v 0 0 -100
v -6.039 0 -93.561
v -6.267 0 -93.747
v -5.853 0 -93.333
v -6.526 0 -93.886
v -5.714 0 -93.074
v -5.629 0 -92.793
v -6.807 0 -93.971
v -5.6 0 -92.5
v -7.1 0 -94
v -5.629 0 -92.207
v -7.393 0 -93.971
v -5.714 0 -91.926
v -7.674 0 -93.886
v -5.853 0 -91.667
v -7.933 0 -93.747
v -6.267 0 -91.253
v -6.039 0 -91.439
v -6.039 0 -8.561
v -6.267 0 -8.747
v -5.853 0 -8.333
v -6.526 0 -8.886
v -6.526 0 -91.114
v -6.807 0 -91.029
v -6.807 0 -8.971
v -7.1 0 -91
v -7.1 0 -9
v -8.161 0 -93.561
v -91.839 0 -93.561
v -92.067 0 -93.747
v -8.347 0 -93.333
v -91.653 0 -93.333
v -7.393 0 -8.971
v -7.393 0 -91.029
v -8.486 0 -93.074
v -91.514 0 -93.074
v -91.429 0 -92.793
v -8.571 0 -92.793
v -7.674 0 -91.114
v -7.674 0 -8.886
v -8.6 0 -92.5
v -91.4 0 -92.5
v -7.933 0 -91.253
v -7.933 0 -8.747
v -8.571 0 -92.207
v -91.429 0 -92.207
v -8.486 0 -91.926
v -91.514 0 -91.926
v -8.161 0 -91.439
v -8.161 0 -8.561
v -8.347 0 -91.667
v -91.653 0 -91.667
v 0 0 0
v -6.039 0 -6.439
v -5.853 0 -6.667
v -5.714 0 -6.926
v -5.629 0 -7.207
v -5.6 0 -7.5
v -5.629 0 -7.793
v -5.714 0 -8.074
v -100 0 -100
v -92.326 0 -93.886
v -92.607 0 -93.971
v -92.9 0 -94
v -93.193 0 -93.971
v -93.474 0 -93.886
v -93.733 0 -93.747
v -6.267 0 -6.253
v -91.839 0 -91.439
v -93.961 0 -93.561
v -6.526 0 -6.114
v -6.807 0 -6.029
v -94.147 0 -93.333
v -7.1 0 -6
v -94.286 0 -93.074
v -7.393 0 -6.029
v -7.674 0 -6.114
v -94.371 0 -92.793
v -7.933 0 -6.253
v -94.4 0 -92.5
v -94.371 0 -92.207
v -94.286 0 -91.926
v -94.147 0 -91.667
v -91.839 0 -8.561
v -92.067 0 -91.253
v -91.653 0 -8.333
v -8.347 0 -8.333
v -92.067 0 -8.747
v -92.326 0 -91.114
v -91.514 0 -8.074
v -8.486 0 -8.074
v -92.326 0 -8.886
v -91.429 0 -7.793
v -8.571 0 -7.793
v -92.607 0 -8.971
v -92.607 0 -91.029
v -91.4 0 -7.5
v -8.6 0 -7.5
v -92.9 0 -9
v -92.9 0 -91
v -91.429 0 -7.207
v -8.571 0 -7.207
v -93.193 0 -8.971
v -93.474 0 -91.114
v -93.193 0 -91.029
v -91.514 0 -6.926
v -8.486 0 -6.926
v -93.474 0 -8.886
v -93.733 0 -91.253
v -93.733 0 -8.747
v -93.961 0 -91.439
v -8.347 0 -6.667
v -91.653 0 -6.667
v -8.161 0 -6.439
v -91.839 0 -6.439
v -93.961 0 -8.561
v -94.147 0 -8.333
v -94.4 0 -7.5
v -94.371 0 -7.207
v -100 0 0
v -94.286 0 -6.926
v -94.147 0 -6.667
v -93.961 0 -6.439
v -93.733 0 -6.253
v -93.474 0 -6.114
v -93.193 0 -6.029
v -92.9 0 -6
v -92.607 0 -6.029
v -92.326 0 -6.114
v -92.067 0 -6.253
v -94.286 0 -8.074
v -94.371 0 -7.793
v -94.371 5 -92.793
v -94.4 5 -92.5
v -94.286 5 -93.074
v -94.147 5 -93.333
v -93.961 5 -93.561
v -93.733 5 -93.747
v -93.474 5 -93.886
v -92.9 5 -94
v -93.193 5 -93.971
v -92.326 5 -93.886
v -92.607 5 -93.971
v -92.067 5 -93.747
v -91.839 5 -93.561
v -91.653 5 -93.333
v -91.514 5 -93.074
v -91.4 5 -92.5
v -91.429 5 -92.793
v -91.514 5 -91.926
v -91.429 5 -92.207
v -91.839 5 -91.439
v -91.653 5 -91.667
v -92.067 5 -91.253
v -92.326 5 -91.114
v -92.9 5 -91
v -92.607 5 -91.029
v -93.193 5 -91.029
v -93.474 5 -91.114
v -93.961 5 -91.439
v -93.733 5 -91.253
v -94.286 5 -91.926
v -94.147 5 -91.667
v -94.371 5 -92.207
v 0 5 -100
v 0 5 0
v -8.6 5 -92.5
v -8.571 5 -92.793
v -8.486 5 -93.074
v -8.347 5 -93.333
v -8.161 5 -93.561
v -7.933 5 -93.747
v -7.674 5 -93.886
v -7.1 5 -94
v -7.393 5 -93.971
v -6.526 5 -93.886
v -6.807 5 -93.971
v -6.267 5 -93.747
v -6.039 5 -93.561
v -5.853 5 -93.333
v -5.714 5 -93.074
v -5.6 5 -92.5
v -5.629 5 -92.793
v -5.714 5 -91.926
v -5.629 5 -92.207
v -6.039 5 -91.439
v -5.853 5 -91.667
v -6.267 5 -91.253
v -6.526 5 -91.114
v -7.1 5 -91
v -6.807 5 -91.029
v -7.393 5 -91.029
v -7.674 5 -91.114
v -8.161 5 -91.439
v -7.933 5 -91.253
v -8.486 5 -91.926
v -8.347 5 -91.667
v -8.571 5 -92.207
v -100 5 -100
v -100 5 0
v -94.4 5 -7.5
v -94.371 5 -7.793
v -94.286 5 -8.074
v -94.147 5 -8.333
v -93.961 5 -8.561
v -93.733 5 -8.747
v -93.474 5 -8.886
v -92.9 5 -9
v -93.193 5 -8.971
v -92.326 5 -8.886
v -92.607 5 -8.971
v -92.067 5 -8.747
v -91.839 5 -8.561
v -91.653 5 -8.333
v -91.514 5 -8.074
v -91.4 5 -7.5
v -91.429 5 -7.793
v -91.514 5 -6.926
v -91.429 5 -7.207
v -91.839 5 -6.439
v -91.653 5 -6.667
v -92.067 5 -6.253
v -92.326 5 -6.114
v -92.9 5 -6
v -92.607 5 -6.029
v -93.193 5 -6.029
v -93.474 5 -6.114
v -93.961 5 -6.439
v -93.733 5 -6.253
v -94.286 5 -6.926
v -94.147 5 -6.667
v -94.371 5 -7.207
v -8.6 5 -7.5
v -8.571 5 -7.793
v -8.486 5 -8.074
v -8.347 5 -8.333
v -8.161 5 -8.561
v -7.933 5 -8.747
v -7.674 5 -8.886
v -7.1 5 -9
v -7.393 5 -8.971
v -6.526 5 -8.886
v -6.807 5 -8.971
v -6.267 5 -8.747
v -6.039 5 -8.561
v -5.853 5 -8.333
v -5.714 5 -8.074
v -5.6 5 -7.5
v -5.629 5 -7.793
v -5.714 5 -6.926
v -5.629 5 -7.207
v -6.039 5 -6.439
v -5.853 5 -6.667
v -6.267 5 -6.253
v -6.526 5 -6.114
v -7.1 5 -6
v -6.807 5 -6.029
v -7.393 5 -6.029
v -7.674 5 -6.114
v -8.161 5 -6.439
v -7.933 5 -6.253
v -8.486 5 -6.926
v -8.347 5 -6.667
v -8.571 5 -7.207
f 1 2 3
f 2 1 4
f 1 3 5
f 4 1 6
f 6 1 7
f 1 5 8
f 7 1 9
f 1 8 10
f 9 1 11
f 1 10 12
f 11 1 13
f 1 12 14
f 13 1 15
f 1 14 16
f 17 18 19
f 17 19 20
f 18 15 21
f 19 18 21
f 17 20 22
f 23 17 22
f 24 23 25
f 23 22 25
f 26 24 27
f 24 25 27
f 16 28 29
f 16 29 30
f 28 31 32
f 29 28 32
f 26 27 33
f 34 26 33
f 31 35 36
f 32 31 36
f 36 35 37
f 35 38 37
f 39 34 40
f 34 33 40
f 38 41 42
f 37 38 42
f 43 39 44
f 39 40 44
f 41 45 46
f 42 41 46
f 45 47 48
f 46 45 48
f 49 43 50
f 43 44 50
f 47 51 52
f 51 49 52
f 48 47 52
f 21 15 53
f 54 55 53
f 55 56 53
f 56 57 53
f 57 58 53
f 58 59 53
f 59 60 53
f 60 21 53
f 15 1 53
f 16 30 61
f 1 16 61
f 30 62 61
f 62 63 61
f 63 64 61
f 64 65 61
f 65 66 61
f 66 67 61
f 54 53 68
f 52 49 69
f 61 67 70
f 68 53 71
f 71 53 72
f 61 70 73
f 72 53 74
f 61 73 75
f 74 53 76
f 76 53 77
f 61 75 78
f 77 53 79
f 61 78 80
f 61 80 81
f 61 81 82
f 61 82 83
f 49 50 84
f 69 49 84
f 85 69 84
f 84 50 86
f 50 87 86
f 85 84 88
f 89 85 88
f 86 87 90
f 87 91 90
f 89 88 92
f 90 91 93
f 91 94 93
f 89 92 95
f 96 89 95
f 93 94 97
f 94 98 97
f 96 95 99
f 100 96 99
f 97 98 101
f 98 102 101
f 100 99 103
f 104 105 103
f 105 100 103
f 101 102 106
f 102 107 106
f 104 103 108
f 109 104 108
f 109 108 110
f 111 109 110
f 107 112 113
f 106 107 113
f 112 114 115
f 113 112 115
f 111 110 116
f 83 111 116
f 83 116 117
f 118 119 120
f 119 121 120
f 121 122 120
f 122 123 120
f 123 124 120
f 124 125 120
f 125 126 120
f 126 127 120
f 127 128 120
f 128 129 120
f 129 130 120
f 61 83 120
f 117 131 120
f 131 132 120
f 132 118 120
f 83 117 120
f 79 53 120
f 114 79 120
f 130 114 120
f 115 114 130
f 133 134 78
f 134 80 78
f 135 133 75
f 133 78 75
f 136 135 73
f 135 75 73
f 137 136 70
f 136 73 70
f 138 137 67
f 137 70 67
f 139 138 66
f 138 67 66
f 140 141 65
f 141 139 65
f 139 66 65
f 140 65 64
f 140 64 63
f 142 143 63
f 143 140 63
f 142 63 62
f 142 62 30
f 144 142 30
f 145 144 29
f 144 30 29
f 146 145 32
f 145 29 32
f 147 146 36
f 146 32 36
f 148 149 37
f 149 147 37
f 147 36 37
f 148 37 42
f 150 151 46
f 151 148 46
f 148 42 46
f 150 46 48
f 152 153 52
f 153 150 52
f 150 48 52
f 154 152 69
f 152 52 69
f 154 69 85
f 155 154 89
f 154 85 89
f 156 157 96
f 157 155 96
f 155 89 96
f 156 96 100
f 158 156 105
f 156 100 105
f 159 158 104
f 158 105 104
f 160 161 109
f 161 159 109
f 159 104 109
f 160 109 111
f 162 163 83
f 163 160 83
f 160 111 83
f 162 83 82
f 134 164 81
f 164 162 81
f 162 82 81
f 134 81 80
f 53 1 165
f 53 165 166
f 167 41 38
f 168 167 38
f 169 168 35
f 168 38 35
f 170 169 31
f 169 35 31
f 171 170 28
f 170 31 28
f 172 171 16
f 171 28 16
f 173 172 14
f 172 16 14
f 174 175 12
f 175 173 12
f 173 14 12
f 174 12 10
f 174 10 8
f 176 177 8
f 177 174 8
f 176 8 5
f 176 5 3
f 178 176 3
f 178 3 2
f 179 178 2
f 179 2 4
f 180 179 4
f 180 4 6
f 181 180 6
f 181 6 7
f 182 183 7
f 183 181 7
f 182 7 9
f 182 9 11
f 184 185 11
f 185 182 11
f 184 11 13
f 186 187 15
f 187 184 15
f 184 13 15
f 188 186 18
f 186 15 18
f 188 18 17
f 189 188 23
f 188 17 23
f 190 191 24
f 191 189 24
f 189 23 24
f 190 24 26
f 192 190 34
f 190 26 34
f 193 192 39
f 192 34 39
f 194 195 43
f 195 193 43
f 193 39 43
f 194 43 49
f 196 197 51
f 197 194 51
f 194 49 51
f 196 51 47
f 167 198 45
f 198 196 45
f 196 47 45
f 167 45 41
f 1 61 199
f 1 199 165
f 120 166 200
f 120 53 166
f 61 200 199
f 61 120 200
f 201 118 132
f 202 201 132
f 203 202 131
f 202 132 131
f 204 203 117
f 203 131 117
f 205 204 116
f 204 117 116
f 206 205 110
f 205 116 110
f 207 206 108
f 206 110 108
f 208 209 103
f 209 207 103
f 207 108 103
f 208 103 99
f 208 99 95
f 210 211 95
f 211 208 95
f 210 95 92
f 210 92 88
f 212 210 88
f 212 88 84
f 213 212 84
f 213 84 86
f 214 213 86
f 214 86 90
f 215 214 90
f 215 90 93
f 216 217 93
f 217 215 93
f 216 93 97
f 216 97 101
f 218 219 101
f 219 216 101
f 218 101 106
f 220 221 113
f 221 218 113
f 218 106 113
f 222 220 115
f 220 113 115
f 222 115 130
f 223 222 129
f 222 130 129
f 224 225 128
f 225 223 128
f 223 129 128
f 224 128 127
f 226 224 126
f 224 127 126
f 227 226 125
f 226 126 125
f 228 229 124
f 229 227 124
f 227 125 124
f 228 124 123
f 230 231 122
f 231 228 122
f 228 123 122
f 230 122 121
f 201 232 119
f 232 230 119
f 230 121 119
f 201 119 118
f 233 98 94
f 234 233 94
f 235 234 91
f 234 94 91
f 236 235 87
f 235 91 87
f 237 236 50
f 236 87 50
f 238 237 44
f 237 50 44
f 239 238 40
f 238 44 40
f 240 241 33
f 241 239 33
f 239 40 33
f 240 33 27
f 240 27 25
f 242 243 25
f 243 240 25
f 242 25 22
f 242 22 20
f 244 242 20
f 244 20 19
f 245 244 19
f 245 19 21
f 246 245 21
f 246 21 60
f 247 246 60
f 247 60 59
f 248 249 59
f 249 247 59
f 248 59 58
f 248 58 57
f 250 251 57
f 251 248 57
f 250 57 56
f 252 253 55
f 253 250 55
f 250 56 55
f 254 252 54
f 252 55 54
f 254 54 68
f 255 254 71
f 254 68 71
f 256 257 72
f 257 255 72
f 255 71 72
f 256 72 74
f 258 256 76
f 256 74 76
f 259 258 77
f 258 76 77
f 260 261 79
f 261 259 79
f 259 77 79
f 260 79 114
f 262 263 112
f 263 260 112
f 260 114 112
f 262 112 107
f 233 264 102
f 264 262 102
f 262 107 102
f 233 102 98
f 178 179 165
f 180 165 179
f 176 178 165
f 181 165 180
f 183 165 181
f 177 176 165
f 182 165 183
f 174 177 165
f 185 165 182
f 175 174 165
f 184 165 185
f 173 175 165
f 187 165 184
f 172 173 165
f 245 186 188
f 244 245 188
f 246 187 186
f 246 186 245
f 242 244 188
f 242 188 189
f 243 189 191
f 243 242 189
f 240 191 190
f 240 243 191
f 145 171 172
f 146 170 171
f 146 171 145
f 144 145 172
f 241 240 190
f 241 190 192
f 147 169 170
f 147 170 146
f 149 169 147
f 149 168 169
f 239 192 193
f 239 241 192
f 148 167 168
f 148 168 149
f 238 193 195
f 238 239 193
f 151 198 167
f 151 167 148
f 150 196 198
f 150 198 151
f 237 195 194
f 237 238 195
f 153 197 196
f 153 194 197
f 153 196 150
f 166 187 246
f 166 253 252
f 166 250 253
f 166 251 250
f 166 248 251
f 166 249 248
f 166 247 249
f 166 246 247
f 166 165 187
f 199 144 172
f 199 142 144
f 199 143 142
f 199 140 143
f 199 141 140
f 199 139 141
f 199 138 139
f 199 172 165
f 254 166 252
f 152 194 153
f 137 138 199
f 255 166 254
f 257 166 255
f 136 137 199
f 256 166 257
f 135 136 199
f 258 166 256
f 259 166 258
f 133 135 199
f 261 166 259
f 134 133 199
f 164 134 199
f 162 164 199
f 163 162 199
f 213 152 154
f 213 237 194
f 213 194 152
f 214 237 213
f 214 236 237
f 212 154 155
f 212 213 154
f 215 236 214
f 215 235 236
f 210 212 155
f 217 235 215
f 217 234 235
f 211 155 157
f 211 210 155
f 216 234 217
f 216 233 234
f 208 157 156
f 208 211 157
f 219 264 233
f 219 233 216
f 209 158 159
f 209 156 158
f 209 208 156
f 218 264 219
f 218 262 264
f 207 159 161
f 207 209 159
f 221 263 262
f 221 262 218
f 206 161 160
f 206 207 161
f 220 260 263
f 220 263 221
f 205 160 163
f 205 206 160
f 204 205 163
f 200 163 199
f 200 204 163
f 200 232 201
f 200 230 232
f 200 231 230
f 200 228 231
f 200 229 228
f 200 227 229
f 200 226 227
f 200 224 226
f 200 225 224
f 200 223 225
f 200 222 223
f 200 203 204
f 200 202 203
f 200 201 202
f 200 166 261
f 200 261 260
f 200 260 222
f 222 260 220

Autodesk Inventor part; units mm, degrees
ref_plane "YZ Plane" through (0, 0, 0) normal (1, 0, 0) x (0, 1, 0)
ref_plane "XZ Plane" through (0, 0, 0) normal (0, 1, 0) x (-1, 0, 0)
ref_plane "XY Plane" through (0, 0, 0) normal (0, 0, 1) x (1, 0, 0)
sketch "Sketch1" plane through (0, 0, 0) normal (0, 1, 0) x (-1, 0, 0)
  line L0 (0, 0) -> (100, 0)
  line L1 (100, 0) -> (100, -100)
  line L2 (100, -100) -> (0, -100)
  line L3 (0, -100) -> (0, 0)
  line L4 (100, -50) -> (0, -50) construction
  line L5 (7.1, -7.5) -> (92.9, -7.5) construction
  line L6 (92.9, -7.5) -> (92.9, -92.5) construction
  line L7 (92.9, -92.5) -> (7.1, -92.5) construction
  line L8 (7.1, -92.5) -> (7.1, -7.5) construction
  line L9 (7.1, -7.5) -> (92.9, -92.5) construction
  line L10 (92.9, -7.5) -> (7.1, -92.5) construction
  circle A0 centre (92.9, -7.5) radius 1.5
  circle A1 centre (92.9, -92.5) radius 1.5
  circle A2 centre (7.1, -92.5) radius 1.5
  circle A3 centre (7.1, -7.5) radius 1.5
  point P0 (50, -50)
  dimension "d0" = 100
  dimension "d1" = 100
  dimension "d2" = 85.8
  dimension "d3" = 85
  dimension "d4" = 3
  dimension "d5" = 3
  dimension "d6" = 3
  dimension "d7" = 3
extrude "Extrusion1" add sketch "Sketch1" along normal blind 5
sketch "Sketch2" plane through (0, 5, 0) normal (0, 1, 0) x (1, 0, 0)
  line L0 (-100, 100) -> (-100, 0) projected
  line L1 (-100, 30) -> (-97, 30)
  line L2 (-97, 30) -> (-97, 70)
  line L3 (-97, 70) -> (-100, 70)
  line L4 (-100, 70) -> (-100, 30)
  line L5 (-97, 50) -> (-100, 50) construction
  line L6 (0, 0) -> (0, 100) projected
  line L7 (0, 50) -> (-100, 50) construction
  line L8 (-100, 0) -> (0, 0) projected
  line L9 (-50, 0) -> (-50, 98) construction
  line L10 (-70, 0) -> (-30, 0)
  line L11 (-30, 0) -> (-30, 3)
  line L12 (-30, 3) -> (-70, 3)
  line L13 (-70, 3) -> (-70, 0)
  line L14 (-50, 3) -> (-50, 0) construction
  line L15 (0, 30) -> (-3, 30)
  line L16 (-3, 30) -> (-3, 70)
  line L17 (-3, 70) -> (0, 70)
  line L18 (0, 70) -> (0, 30)
  line L19 (-3, 50) -> (0, 50) construction
  line L20 (-70, 100) -> (-30, 100)
  line L21 (-30, 100) -> (-30, 97)
  line L22 (-30, 97) -> (-70, 97)
  line L23 (-70, 97) -> (-70, 100)
  line L24 (-50, 97) -> (-50, 100) construction
  dimension "d10" = 40
  dimension "d11" = 3
  dimension "d12" = 40
  dimension "d13" = 3
extrude "Extrusion2" [suppressed]
properties part number "Base"
